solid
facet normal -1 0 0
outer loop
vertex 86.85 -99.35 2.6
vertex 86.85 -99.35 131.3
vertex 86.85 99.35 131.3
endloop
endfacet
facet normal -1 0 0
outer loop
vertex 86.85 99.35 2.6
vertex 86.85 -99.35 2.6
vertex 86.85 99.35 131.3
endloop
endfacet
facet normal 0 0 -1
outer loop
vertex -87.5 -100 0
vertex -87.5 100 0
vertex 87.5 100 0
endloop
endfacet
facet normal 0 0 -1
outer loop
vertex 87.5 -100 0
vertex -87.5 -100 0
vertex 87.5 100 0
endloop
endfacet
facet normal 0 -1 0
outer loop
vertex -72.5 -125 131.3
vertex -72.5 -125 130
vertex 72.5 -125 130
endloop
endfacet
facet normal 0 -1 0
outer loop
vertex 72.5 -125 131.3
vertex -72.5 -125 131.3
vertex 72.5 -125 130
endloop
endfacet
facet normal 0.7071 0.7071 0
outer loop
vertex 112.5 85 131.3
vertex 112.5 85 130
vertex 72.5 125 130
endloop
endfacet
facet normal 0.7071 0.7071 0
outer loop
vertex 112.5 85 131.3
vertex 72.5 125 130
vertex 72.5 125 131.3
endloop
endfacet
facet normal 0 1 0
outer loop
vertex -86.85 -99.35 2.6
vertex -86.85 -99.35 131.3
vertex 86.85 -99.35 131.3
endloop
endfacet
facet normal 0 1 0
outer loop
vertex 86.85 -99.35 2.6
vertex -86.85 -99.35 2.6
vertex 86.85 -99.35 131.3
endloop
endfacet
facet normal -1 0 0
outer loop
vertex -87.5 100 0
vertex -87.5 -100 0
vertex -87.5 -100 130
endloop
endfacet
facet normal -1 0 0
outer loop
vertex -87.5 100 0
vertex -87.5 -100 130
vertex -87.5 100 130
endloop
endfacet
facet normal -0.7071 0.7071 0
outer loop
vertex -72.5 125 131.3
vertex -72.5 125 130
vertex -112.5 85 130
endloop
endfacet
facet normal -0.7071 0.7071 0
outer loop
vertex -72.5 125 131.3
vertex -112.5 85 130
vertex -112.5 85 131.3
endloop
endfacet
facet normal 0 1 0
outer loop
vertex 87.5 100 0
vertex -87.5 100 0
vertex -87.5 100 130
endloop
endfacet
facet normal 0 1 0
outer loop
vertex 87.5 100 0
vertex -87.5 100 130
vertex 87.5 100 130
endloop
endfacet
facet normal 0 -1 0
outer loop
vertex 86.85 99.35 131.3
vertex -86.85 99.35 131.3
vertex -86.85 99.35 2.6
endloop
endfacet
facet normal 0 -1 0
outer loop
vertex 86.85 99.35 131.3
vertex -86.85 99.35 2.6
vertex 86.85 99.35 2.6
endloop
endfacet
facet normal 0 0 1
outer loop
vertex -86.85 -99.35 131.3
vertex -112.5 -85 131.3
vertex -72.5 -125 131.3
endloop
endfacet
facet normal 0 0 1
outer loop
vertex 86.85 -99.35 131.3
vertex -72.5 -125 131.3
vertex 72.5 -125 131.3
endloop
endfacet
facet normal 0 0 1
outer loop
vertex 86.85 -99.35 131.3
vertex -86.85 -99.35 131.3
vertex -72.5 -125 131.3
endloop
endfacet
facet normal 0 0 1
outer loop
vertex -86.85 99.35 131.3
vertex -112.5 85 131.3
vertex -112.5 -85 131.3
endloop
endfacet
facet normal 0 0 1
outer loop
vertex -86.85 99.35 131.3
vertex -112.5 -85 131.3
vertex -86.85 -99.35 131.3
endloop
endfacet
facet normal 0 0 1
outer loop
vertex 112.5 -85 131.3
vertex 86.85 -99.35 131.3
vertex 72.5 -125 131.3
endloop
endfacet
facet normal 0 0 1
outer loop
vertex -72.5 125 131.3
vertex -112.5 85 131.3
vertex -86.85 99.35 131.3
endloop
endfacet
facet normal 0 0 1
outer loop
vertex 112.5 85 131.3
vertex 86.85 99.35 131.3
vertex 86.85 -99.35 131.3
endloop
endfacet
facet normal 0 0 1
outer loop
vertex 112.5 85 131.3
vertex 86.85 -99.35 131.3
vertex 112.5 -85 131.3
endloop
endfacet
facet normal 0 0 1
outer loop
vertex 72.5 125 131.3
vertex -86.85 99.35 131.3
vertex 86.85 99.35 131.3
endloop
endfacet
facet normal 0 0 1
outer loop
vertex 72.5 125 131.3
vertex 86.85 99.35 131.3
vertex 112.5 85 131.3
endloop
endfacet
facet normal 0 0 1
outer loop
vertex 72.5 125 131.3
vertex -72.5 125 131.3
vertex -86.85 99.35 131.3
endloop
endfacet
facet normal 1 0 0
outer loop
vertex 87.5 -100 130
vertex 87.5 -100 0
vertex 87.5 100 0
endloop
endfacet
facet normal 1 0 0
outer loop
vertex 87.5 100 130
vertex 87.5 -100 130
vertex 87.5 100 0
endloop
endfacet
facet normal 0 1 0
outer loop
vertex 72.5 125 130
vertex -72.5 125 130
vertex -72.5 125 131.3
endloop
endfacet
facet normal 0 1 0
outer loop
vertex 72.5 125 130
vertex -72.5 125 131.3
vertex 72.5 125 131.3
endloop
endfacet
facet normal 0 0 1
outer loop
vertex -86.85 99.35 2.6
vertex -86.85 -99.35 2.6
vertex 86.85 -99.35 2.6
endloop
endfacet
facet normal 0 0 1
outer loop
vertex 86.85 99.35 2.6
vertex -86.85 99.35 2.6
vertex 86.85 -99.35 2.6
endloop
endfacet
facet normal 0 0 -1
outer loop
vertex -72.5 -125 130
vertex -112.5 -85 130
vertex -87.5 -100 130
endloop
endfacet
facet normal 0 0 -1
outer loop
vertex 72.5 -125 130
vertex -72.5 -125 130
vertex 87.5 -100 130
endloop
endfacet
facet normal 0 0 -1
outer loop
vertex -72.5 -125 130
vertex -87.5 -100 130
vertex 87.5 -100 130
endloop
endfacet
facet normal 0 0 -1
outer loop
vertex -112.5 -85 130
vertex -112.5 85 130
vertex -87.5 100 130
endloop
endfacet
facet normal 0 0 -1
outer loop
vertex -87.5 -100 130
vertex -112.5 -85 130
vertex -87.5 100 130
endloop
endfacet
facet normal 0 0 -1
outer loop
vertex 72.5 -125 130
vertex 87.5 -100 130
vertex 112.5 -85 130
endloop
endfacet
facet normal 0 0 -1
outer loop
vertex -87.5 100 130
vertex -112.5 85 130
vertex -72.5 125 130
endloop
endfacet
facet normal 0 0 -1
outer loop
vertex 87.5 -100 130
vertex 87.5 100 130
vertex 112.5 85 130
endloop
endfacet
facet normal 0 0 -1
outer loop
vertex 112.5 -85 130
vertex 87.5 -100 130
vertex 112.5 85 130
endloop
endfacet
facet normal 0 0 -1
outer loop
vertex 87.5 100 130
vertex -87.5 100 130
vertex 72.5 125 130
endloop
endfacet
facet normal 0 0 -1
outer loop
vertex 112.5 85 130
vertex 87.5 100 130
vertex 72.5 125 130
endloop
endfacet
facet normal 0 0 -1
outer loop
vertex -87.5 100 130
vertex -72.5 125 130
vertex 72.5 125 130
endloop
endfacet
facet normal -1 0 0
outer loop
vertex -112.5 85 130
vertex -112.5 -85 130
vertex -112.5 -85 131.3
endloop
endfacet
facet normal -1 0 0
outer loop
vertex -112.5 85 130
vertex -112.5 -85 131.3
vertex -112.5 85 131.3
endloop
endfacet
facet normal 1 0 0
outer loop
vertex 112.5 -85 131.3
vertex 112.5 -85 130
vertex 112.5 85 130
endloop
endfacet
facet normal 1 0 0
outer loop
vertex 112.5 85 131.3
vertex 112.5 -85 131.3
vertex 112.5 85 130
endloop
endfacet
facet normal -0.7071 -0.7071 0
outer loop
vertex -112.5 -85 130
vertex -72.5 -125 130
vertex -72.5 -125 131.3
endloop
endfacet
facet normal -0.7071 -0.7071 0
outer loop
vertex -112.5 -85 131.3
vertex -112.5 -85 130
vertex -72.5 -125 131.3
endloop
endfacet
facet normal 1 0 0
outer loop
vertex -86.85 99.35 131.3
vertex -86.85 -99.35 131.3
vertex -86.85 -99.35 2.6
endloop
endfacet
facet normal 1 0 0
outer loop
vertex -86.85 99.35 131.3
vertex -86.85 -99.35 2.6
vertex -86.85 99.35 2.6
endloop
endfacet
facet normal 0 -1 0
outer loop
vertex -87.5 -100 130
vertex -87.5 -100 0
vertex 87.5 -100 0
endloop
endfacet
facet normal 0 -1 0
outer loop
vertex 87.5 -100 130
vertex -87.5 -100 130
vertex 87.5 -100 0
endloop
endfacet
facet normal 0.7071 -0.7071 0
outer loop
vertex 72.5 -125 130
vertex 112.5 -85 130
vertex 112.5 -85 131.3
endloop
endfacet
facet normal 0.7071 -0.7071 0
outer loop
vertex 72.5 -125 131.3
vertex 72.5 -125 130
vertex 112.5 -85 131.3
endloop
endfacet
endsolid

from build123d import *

# Parameters (mm, degrees)
F0_W     = 175
F0_H     = 200
F1_DEPTH = 130
F2_W     = 225
F2_H     = 250
F3_DEPTH = 1.3
F4_W     = 173.7
F4_H     = 198.7
F5_DEPTH = 128.7
F6_SIZE  = 40


with BuildPart() as f1:
    # F0 (on Top) → F1 (new body)
    with BuildSketch(Plane.XY):
        Rectangle(F0_W, F0_H)
    extrude(amount=F1_DEPTH)

    # F2 (on face) → F3 (join)
    with BuildSketch(Plane.XY.offset(130)):
        Rectangle(F2_W, F2_H)
    extrude(amount=F3_DEPTH)

    # F4 (on face) → F5 (cut)
    with BuildSketch(Plane.XY.offset(131.3)):
        Rectangle(F4_W, F4_H)
    extrude(amount=-F5_DEPTH, mode=Mode.SUBTRACT)

    # F6
    f6_edges = [f1.edges().sort_by_distance(p)[0] for p in [
        (112.5, -125, 130.65),
        (-112.5, -125, 130.65),
        (112.5, 125, 130.65),
        (-112.5, 125, 130.65),
    ]]
    chamfer(f6_edges, length=F6_SIZE)


solid = f1.part
